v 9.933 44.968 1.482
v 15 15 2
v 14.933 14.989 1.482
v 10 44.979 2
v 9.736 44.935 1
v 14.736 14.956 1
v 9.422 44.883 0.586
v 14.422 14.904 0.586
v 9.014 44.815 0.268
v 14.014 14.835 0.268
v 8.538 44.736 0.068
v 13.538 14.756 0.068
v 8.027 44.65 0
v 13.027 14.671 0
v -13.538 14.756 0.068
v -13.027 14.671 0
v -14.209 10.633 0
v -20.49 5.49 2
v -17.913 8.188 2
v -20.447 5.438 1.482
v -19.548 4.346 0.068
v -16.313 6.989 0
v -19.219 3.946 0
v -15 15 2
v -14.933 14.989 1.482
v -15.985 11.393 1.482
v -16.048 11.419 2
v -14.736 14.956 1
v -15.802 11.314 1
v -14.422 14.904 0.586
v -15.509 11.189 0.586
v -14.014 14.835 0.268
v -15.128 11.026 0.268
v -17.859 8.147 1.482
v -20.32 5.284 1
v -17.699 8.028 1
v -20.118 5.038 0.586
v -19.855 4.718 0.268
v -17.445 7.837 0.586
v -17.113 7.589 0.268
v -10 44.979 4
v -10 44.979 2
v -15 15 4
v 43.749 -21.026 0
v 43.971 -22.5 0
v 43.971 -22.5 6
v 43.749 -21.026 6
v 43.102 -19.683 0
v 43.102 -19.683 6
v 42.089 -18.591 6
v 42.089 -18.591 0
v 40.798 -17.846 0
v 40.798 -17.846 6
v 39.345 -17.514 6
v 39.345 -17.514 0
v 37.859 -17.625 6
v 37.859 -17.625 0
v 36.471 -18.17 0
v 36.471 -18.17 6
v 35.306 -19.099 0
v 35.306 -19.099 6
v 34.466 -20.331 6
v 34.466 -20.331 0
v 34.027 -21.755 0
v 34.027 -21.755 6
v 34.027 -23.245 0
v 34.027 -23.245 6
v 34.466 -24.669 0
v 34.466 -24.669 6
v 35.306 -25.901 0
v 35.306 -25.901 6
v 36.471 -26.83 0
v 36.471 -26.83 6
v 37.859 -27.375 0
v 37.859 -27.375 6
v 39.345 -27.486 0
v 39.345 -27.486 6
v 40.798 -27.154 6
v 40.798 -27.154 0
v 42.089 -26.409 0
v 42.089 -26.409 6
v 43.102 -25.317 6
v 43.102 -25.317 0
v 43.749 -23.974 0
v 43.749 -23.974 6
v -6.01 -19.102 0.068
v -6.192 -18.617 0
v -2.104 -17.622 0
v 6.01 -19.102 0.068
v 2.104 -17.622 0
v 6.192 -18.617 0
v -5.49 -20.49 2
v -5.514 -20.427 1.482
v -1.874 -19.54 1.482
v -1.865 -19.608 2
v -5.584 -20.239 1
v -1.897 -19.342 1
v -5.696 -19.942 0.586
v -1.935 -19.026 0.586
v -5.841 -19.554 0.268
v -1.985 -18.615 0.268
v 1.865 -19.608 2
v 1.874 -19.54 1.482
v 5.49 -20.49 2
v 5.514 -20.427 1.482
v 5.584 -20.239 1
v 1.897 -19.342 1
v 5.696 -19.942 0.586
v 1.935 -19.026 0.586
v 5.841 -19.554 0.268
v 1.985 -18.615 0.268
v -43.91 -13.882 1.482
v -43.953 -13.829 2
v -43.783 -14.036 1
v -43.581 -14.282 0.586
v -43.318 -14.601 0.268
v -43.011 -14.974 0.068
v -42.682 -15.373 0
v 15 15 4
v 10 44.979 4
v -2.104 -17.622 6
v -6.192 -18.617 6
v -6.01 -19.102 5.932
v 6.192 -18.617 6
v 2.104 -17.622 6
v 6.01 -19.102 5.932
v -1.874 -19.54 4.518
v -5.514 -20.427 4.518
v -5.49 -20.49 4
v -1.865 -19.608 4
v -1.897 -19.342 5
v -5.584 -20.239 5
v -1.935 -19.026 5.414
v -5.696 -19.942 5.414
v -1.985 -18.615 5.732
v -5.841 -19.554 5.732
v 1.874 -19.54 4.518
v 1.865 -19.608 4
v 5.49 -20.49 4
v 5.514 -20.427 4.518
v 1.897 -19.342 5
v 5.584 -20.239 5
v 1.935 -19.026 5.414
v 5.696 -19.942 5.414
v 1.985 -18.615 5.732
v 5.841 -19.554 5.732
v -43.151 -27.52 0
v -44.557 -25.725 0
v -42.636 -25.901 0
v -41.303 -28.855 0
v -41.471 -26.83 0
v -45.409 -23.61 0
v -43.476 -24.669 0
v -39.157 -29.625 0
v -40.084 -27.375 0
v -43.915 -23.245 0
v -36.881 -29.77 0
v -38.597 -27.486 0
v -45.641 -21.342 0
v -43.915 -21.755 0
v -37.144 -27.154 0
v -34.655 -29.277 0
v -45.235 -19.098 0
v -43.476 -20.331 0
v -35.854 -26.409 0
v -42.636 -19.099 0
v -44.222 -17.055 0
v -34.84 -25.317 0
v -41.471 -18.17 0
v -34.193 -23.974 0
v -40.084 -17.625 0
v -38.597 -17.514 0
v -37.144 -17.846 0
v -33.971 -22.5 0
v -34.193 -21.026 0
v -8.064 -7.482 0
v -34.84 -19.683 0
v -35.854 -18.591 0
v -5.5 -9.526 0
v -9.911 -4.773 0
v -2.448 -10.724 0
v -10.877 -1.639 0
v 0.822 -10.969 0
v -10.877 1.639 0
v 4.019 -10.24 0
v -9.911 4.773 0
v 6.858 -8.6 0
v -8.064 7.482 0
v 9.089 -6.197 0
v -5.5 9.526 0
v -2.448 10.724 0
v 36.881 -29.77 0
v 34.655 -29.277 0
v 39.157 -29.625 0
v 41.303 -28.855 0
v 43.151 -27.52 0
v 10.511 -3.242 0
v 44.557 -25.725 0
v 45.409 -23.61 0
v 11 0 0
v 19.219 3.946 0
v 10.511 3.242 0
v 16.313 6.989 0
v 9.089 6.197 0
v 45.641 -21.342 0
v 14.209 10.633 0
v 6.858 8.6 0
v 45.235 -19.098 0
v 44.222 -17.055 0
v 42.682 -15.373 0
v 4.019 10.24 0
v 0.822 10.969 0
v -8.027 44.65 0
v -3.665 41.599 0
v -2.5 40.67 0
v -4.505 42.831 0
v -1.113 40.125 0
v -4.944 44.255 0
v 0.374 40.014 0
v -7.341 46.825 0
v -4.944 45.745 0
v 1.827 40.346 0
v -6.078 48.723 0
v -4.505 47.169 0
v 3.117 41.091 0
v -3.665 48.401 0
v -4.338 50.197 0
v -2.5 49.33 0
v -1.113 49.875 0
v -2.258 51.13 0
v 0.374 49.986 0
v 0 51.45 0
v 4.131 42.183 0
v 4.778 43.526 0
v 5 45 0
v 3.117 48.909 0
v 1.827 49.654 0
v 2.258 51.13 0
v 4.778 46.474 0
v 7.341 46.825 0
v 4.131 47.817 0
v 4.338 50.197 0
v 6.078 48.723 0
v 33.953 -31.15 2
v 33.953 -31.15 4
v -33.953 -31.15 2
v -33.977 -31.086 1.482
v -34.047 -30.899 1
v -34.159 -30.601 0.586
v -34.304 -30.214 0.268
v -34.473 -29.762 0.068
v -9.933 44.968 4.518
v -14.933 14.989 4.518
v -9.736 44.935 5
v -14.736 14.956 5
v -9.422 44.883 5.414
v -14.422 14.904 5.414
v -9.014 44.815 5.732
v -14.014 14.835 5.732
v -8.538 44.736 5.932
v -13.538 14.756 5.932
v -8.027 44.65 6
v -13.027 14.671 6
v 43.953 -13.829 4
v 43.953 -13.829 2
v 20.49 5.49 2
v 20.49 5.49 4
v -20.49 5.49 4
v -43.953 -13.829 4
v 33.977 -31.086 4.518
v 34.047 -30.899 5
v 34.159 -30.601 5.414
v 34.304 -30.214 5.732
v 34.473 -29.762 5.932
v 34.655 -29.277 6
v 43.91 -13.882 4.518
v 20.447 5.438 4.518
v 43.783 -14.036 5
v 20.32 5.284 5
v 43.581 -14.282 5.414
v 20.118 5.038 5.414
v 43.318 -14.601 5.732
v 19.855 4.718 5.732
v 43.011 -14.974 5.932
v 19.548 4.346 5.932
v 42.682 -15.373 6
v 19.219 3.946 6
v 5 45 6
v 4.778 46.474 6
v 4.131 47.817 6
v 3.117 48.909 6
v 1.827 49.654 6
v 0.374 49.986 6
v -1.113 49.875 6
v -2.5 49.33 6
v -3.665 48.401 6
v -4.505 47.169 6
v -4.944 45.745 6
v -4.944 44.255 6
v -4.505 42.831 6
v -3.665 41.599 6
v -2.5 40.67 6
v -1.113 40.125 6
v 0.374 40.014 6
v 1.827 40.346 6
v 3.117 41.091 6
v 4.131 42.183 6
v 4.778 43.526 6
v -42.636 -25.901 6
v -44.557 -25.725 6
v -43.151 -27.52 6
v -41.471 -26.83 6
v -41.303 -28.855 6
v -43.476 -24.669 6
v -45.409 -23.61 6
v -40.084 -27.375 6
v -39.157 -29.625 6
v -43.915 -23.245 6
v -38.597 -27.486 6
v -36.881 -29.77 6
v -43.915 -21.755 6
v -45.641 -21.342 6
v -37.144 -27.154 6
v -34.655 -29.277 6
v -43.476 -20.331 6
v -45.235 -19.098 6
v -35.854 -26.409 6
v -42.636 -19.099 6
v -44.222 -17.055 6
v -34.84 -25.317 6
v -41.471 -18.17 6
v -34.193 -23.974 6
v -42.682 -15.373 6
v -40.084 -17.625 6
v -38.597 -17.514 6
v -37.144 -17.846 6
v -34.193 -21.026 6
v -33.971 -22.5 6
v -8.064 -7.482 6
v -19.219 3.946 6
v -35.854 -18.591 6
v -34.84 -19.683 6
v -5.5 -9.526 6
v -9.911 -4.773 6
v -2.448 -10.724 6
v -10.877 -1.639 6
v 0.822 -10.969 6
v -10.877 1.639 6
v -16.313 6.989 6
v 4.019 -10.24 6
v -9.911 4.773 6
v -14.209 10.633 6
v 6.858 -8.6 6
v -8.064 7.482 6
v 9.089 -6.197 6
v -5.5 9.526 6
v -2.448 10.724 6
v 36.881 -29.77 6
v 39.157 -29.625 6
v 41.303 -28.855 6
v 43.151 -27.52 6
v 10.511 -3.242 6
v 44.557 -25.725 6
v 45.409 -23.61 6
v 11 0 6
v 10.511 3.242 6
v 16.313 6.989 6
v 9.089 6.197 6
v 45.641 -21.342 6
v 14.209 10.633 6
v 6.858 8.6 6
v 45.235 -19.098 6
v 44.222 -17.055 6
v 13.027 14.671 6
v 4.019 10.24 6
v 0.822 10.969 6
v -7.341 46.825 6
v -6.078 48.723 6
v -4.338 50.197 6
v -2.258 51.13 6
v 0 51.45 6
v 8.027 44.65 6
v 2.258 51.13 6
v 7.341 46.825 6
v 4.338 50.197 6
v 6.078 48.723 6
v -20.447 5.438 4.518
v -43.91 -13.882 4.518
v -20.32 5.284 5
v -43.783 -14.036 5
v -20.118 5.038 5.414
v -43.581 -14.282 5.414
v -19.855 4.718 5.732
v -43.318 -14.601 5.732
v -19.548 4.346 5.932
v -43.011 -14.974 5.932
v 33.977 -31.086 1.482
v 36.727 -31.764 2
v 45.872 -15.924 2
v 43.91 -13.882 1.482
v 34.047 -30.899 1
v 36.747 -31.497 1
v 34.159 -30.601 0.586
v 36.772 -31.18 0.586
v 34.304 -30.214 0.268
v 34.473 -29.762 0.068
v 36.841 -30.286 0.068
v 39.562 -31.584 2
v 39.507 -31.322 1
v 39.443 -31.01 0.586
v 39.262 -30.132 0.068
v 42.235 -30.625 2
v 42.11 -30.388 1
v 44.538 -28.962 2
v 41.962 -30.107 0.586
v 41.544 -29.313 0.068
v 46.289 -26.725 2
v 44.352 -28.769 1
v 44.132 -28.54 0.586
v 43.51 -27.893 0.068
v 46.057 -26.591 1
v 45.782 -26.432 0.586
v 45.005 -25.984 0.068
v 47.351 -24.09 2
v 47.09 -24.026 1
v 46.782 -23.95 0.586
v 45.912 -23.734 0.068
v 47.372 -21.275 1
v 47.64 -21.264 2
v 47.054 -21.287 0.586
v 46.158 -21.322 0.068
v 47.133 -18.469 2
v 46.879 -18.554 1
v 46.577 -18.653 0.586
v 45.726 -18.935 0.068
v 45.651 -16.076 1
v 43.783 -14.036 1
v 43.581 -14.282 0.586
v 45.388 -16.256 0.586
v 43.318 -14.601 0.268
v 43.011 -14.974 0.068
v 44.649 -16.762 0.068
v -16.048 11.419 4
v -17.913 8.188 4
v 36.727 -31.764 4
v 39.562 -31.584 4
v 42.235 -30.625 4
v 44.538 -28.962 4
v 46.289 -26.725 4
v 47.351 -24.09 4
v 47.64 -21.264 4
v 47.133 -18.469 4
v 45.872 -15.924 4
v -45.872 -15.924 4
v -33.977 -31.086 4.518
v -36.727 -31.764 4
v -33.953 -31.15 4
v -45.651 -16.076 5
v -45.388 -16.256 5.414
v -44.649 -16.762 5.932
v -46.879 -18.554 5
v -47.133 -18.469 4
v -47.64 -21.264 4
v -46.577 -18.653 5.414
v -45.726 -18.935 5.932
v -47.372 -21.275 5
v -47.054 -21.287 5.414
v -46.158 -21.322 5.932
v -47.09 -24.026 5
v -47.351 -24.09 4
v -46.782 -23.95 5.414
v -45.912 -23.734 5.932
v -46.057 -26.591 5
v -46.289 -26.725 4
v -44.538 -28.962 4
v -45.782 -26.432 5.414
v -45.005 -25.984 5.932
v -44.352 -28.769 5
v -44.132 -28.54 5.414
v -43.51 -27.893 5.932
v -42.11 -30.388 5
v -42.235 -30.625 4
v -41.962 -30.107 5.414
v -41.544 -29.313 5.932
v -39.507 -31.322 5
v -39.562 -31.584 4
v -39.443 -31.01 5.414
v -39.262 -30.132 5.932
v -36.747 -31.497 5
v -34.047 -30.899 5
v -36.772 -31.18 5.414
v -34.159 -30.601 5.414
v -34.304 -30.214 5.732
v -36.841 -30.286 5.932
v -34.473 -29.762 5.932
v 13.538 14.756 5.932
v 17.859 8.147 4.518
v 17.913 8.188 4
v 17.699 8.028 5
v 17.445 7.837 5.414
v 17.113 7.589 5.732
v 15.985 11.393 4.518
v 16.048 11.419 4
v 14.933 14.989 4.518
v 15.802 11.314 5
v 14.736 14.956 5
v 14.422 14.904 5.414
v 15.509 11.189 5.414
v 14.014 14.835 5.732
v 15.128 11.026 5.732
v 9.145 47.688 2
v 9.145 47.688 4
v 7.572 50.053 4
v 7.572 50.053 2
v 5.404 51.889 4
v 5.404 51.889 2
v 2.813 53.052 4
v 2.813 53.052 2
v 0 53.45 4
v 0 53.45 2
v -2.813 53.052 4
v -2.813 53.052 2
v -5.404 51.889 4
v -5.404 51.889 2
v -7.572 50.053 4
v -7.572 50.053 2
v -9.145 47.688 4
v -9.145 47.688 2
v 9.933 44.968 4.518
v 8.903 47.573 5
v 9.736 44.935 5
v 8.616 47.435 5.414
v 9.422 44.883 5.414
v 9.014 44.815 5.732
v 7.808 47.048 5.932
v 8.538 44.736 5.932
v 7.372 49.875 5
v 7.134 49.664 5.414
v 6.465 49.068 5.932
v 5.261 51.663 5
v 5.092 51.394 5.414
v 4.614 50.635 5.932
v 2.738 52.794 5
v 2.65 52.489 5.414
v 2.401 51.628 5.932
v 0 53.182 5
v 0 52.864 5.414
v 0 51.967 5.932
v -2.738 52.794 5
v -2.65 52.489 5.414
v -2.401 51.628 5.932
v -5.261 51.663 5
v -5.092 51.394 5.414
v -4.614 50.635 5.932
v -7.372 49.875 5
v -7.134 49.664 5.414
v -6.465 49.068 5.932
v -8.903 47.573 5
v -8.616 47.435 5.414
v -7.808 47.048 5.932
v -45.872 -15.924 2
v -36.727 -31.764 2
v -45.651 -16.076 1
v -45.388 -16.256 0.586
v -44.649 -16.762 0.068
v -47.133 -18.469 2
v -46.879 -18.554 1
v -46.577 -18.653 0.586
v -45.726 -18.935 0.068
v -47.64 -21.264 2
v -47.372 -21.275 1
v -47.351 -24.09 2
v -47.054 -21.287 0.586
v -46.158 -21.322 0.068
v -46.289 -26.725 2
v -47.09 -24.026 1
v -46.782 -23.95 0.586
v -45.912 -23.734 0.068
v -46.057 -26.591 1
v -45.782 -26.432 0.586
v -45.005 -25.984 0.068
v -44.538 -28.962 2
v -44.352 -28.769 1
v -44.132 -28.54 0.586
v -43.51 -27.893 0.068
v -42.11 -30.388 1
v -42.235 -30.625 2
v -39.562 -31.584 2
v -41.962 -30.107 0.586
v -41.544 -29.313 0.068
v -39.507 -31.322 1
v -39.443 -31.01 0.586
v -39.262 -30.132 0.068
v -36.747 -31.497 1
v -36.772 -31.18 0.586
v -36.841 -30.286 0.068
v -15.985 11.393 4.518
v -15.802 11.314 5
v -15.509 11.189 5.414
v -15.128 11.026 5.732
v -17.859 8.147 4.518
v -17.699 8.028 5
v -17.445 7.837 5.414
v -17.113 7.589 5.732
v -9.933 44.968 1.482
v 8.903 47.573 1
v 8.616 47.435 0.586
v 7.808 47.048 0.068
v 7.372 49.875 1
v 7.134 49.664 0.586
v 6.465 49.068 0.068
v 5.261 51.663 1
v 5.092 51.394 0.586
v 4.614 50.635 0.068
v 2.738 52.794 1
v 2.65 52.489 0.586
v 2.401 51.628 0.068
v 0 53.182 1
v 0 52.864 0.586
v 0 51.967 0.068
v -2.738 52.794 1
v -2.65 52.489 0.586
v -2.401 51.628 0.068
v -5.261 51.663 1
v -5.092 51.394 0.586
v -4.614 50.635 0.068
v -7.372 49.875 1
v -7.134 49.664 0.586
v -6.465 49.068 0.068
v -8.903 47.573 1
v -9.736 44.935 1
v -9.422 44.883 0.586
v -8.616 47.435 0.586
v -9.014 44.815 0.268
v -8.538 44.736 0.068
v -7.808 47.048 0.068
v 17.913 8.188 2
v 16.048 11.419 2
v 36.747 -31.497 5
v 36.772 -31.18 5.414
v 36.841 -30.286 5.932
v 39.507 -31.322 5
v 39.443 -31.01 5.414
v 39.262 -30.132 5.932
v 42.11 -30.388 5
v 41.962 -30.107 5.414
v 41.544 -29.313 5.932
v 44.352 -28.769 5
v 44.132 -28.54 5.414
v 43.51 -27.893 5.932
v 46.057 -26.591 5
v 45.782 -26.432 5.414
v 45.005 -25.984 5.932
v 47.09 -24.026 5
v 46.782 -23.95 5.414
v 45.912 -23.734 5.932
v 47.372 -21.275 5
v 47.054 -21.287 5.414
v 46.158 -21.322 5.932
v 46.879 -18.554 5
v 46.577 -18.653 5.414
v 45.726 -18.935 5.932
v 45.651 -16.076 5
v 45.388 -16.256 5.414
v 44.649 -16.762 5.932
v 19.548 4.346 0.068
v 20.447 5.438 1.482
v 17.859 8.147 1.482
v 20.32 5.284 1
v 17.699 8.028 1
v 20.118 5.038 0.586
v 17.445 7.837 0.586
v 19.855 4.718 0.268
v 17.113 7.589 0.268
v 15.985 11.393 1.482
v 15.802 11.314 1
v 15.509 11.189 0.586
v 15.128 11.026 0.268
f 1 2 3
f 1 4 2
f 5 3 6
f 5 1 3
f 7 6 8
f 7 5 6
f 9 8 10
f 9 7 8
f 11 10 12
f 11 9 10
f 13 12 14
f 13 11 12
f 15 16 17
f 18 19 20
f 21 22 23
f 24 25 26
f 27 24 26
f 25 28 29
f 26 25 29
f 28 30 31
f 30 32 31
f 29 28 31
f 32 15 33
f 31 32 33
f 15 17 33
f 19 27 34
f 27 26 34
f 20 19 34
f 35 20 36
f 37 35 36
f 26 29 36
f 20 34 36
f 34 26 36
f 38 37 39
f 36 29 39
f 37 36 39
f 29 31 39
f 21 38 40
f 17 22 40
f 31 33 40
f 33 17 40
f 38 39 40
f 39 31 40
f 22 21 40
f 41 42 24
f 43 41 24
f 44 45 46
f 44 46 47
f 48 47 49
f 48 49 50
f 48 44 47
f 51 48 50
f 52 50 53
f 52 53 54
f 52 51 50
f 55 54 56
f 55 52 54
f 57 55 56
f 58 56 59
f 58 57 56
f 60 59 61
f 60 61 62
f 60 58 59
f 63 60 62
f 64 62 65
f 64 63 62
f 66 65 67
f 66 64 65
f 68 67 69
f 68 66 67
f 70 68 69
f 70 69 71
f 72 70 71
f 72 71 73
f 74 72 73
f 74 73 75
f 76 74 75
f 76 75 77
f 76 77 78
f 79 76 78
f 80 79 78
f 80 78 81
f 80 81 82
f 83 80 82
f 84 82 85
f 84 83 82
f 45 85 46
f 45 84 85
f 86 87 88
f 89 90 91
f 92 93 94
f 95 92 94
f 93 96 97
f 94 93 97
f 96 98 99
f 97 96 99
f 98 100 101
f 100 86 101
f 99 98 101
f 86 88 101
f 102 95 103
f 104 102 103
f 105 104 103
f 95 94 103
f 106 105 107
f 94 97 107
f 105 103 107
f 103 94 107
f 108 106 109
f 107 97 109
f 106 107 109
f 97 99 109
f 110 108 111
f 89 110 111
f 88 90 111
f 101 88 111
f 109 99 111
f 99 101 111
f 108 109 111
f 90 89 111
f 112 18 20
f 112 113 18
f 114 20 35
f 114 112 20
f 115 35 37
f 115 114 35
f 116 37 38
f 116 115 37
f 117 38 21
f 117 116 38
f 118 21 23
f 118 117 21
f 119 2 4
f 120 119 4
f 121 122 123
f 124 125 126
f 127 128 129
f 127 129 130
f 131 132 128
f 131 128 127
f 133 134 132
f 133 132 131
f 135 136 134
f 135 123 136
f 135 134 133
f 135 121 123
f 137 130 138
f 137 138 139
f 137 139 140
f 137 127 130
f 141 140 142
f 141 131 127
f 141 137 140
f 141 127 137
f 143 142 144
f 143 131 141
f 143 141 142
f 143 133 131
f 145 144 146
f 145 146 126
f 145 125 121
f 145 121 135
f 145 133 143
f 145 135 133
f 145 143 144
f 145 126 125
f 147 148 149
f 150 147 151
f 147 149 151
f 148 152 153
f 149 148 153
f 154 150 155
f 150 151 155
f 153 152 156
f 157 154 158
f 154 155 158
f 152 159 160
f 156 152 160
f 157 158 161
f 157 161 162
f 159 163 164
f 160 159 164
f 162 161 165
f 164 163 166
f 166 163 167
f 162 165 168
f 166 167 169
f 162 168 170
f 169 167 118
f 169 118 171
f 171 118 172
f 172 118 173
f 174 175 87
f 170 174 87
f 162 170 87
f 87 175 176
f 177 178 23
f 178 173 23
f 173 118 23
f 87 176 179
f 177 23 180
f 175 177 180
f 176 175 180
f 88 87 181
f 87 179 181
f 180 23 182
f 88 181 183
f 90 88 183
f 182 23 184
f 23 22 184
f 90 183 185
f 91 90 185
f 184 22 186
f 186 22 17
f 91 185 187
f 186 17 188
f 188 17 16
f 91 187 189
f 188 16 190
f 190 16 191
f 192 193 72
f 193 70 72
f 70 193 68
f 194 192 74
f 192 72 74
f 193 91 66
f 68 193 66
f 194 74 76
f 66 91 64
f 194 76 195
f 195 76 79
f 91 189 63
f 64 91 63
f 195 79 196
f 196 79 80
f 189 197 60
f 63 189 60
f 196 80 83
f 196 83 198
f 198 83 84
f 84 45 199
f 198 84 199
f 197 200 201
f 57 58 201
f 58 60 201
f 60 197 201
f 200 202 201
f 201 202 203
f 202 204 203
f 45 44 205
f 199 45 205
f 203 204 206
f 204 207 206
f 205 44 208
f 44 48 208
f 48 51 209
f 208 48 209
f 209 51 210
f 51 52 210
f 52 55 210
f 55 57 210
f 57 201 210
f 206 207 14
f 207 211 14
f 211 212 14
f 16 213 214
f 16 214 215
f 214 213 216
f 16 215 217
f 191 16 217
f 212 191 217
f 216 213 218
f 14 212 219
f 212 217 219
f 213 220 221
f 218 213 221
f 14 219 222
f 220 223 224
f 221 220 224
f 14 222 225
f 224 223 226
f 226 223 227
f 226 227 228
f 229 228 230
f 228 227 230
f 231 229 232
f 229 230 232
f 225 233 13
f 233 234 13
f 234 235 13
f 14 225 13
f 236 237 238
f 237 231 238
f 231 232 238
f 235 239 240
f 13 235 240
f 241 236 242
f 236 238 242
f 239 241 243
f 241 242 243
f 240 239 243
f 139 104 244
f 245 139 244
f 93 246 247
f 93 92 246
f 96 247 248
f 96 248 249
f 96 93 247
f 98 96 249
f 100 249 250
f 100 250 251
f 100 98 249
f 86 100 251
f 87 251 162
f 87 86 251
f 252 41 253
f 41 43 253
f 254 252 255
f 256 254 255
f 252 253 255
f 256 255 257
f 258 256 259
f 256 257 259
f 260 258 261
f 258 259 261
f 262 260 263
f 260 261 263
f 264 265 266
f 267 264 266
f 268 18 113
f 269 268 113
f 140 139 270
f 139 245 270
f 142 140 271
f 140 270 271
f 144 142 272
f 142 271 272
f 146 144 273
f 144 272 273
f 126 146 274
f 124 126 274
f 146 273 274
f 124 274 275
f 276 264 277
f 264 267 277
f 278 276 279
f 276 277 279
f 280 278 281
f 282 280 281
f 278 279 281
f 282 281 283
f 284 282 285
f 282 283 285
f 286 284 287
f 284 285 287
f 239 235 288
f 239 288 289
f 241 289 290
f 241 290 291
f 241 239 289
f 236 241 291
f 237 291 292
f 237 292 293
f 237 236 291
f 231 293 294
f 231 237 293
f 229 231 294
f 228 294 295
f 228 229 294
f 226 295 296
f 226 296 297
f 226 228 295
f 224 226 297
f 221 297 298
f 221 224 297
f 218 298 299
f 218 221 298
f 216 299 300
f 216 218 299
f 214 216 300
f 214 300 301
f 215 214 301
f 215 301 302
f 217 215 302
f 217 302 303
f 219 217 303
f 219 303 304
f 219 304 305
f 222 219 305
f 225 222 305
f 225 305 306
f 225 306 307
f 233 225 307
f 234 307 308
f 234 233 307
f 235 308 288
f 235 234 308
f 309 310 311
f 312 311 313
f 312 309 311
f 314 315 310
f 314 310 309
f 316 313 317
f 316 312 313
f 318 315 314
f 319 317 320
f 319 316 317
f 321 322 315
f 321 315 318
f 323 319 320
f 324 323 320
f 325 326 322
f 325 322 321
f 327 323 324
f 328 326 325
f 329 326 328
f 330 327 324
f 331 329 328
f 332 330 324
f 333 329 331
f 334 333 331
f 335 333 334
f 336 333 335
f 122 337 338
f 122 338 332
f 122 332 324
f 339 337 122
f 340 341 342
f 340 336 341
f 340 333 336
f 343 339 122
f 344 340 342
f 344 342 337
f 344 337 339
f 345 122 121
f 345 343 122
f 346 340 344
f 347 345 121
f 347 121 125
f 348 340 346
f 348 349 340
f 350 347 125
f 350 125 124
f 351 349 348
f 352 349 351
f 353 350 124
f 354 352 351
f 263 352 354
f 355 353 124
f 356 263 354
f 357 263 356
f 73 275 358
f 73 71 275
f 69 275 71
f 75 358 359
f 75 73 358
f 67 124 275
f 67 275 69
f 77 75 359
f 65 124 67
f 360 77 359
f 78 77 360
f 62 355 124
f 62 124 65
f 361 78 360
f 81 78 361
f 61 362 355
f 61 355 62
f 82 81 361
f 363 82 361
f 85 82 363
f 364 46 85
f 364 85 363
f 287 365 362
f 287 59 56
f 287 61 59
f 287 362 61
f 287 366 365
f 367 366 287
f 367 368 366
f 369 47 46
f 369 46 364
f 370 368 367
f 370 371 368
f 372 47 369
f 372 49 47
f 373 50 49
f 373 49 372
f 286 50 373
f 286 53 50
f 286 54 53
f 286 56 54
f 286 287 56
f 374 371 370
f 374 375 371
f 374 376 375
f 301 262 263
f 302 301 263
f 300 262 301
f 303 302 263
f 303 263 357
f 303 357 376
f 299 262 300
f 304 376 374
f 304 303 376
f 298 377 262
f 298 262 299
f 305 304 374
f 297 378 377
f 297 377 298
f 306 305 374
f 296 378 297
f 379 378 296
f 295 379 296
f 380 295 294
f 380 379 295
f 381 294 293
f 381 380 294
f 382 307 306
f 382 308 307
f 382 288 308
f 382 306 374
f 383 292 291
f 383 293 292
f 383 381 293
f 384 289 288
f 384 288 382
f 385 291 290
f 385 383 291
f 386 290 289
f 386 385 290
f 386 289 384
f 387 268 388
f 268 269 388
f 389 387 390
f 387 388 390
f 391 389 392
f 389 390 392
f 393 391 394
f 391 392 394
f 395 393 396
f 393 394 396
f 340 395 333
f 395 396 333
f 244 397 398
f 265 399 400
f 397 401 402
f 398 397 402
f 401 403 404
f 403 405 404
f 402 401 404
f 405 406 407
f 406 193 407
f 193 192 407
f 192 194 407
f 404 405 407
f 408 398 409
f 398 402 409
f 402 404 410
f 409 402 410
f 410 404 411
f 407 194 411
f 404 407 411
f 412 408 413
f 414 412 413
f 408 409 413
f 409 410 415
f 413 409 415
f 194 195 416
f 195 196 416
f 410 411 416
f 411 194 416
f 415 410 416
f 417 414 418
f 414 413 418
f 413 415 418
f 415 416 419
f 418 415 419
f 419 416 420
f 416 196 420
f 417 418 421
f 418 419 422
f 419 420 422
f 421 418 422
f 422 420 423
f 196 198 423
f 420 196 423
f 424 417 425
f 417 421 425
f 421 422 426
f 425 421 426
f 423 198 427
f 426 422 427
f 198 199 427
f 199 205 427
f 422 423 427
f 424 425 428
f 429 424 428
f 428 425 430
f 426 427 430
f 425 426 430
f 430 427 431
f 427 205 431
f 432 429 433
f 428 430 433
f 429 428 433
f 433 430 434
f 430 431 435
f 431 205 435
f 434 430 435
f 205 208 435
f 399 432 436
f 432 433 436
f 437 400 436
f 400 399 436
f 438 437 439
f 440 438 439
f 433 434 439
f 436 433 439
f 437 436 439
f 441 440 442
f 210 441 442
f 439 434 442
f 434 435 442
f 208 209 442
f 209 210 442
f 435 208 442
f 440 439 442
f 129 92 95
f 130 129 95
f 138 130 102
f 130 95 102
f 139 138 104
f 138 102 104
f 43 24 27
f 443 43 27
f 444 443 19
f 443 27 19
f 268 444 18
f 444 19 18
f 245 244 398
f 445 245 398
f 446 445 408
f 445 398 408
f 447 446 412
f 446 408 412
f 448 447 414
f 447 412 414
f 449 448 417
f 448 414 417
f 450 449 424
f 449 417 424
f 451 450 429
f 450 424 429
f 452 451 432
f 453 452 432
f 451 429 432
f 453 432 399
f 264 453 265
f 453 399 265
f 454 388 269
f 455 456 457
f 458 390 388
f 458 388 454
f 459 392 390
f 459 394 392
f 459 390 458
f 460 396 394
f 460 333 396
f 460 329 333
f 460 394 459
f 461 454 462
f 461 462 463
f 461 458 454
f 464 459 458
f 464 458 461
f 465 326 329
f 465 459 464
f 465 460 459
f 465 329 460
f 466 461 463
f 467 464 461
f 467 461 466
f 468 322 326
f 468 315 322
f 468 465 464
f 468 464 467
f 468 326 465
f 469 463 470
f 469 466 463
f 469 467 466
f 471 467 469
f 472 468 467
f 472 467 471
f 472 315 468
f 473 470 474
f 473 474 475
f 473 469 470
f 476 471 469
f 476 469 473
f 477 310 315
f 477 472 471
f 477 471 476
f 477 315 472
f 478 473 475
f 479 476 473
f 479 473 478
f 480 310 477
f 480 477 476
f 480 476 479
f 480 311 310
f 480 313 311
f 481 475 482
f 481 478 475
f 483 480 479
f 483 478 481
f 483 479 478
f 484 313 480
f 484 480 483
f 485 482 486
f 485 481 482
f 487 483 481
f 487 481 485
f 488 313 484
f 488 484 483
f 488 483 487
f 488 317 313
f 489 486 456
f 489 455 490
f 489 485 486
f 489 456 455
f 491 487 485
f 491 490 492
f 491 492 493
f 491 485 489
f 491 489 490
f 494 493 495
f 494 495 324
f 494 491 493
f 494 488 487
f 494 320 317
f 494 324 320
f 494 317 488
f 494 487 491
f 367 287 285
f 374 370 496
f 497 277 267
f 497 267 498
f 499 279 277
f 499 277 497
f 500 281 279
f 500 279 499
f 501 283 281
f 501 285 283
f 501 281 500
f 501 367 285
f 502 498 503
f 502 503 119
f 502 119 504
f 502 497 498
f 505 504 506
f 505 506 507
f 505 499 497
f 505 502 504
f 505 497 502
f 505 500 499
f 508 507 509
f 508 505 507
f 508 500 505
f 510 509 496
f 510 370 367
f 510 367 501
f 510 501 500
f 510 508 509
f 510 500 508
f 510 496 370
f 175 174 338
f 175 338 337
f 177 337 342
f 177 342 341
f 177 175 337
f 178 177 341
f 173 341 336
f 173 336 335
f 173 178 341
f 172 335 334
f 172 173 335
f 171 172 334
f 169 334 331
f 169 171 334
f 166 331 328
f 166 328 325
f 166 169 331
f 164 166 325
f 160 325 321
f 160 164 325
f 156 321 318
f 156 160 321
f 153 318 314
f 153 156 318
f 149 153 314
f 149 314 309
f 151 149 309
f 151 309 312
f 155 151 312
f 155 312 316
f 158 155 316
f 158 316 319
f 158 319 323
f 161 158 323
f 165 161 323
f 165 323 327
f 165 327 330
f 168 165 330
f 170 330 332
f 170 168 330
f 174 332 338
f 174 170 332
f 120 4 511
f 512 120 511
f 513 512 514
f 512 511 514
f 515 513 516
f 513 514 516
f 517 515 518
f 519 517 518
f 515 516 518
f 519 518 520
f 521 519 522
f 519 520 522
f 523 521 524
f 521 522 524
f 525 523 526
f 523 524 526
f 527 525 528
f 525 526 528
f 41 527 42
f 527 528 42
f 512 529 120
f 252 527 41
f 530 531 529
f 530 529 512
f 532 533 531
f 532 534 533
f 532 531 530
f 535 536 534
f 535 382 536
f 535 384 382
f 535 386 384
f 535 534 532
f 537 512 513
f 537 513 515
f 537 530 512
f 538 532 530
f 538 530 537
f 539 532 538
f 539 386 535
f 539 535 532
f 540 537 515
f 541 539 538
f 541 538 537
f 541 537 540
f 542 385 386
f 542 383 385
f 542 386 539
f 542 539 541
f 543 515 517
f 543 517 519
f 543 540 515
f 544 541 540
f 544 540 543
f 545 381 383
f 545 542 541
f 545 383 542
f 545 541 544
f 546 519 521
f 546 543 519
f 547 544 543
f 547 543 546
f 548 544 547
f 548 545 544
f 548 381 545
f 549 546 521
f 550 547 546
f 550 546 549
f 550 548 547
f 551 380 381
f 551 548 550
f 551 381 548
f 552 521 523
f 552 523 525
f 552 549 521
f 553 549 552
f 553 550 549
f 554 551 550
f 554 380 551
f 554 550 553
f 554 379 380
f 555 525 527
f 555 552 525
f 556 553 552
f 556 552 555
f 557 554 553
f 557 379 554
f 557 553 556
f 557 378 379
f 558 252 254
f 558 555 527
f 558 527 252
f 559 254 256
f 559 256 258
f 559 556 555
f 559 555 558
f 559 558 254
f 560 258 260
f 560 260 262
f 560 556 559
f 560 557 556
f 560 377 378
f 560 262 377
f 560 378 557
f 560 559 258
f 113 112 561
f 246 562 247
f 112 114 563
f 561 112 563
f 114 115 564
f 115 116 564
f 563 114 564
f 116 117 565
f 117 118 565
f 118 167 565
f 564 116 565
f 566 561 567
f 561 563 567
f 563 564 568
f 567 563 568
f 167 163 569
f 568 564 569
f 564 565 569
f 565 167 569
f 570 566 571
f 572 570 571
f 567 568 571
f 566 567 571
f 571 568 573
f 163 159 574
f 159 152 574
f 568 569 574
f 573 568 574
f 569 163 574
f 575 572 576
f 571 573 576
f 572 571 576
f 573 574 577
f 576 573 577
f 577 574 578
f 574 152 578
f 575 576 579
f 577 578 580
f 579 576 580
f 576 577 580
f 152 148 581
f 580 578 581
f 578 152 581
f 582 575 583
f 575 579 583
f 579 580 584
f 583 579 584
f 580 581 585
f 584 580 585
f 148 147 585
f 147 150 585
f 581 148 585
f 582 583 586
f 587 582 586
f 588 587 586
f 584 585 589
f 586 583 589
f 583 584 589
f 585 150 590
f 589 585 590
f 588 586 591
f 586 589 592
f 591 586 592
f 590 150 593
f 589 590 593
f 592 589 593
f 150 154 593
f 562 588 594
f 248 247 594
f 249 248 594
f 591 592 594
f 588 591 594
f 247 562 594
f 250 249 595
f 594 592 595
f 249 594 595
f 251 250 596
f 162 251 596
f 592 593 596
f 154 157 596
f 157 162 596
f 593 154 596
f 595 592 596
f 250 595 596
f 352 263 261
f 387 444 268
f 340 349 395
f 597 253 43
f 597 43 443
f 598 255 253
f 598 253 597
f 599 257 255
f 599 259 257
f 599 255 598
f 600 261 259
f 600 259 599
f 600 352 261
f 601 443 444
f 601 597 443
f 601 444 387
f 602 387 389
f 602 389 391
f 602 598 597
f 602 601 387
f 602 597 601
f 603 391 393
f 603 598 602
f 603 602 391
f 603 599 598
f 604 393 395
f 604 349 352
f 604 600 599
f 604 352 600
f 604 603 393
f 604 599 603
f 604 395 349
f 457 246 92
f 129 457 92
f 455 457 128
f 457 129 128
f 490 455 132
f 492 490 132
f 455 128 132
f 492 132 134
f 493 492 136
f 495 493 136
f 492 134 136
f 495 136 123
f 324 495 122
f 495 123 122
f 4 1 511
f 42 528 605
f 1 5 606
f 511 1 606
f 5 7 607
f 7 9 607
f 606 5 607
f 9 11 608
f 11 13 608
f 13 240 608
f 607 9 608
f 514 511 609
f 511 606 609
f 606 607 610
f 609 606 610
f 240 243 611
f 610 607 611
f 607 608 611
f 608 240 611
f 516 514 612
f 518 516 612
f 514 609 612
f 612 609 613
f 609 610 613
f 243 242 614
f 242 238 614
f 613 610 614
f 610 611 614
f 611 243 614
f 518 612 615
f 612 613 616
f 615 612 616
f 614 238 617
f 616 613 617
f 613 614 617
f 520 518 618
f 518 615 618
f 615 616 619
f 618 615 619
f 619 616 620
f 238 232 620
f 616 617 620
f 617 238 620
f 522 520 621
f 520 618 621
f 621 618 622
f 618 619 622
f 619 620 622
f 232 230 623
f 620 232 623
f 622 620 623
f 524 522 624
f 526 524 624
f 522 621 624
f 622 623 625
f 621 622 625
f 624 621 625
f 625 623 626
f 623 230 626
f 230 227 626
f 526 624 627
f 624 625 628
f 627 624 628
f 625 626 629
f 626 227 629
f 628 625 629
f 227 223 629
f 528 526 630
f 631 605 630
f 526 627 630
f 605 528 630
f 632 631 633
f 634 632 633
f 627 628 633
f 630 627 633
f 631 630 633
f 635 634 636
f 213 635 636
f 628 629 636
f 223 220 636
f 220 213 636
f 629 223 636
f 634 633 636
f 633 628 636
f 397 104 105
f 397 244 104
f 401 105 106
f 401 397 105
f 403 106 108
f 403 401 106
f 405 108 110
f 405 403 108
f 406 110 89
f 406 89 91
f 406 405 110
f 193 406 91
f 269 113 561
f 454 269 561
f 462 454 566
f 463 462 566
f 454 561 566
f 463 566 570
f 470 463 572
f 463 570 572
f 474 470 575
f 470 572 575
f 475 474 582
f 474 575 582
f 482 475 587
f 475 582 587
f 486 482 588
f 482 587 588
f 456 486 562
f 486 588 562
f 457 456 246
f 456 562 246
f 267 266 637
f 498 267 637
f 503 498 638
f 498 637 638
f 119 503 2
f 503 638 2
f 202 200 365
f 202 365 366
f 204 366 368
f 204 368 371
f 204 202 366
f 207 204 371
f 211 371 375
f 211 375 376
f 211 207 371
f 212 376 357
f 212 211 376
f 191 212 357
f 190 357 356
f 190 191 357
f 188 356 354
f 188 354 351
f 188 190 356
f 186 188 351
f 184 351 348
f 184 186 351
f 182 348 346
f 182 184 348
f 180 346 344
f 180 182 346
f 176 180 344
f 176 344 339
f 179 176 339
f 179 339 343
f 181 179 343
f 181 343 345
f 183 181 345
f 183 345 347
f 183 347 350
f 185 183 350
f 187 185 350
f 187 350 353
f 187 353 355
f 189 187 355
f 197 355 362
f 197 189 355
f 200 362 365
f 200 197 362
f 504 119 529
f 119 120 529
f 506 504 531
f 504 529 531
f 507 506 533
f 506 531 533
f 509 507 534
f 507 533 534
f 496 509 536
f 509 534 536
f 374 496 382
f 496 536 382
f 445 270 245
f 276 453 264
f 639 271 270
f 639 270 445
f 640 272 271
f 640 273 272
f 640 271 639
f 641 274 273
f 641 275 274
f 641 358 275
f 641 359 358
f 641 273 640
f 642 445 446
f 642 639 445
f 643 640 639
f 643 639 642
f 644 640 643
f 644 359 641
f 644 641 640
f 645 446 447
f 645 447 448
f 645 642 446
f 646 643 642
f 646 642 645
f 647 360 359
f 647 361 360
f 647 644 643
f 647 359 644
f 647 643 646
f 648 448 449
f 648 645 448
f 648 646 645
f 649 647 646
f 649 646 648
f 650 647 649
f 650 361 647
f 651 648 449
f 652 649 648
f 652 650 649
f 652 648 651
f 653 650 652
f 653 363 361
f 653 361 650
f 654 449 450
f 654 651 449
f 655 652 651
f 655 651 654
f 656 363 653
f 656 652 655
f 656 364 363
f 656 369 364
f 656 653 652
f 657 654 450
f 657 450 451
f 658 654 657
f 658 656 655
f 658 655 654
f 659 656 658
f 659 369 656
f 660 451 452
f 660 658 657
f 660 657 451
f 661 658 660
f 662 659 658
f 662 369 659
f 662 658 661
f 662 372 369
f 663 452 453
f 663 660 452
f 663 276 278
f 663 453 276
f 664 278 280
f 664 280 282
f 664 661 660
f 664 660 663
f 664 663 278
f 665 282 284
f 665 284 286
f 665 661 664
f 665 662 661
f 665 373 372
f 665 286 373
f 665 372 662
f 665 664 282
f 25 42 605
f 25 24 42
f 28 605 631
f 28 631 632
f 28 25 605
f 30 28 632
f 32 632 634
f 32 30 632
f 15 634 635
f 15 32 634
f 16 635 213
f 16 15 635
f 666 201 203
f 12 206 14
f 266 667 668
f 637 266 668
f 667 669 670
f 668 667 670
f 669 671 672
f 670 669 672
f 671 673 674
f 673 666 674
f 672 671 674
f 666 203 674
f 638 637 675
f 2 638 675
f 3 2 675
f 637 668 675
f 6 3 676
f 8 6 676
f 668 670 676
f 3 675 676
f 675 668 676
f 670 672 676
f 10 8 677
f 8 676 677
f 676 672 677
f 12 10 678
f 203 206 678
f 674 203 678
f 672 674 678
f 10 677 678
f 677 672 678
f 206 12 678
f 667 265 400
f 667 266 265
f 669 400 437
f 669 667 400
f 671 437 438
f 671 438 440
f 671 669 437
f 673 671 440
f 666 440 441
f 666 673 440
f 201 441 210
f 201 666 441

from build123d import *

# Parameters (mm, degrees)
F0_R     = 5
F0_R_2   = 11
F1_DEPTH = 6
F2_R     = 2


with BuildPart() as f1:
    # F0 (on Top) → F1 (new body)
    with BuildSketch(Plane.XY):
        with BuildLine():
            ThreePointArc((10, 44.979472), (0, 53.449789), (-10, 44.979472))
            Line((-10, 44.979472), (-15, 15))
            ThreePointArc((-15, 15), (-16.884039, 9.748004), (-20.490381, 5.490381))
            Line((-20.490381, 5.490381), (-43.953365, -13.829482))
            ThreePointArc((-43.953365, -13.829482), (-46.288875, -26.724895), (-33.953365, -31.14999))
            Line((-33.953365, -31.14999), (-5.490381, -20.490381))
            ThreePointArc((-5.490381, -20.490381), (0, -19.496009), (5.490381, -20.490381))
            Line((5.490381, -20.490381), (33.953365, -31.14999))
            ThreePointArc((33.953365, -31.14999), (46.288875, -26.724895), (43.953365, -13.829482))
            Line((43.953365, -13.829482), (20.490381, 5.490381))
            ThreePointArc((20.490381, 5.490381), (16.884039, 9.748004), (15, 15))
            Line((15, 15), (10, 44.979472))
        make_face()
        with Locations((-38.971143, -22.5)):
            Circle(F0_R, mode=Mode.SUBTRACT)
        with Locations((38.971143, -22.5)):
            Circle(F0_R, mode=Mode.SUBTRACT)
        Circle(F0_R_2, mode=Mode.SUBTRACT)
        with Locations((0, 45)):
            Circle(F0_R, mode=Mode.SUBTRACT)
    extrude(amount=F1_DEPTH)

    # F2
    f2_edges = [f1.edges().sort_by_distance(p)[0] for p in [
        (-12.5, 29.989736, 6),
        (-12.5, 29.989736, 0),
    ]]
    fillet(f2_edges, radius=F2_R)


solid = f1.part
